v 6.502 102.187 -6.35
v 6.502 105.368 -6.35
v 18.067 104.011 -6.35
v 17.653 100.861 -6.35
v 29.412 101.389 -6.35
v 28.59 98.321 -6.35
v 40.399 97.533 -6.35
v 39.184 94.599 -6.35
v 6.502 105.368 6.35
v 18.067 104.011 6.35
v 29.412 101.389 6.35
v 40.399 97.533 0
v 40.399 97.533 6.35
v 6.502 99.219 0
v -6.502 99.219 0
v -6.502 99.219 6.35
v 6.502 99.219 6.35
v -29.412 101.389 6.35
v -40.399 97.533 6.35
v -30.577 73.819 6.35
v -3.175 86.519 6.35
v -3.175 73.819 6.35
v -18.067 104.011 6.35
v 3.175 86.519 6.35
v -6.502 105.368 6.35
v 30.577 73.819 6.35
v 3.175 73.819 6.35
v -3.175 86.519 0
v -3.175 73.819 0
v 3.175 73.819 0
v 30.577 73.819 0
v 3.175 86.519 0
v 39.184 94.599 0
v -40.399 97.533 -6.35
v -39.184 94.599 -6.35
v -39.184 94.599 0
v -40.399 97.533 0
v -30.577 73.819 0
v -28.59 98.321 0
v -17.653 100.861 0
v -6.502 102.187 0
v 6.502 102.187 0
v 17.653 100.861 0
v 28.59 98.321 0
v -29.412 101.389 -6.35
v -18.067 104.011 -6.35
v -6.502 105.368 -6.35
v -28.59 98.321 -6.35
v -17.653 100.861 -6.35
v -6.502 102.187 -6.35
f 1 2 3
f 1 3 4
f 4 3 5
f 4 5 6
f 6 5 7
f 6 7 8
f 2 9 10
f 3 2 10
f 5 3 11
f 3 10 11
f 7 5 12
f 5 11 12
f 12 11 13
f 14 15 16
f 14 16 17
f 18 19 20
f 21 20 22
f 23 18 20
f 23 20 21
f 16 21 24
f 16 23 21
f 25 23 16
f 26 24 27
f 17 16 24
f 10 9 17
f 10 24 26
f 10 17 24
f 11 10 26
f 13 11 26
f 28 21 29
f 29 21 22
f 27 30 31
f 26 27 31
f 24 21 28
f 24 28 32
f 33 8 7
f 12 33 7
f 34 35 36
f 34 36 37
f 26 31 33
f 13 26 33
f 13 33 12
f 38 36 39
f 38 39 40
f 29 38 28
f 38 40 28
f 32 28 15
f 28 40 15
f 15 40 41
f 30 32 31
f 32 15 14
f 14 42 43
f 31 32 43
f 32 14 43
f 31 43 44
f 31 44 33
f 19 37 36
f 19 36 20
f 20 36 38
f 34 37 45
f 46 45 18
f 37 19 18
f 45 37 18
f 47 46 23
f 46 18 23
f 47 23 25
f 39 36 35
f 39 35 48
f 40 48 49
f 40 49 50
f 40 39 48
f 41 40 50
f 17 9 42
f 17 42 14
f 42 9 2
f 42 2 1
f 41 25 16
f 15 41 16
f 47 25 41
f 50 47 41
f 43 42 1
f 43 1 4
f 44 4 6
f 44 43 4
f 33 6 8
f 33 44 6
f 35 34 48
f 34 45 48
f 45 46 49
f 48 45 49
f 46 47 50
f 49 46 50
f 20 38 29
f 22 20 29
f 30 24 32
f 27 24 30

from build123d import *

# Parameters (mm, degrees)
F1_DEPTH      = 6.35
F2_W          = 3.175
F2_H          = 6.35
F4_ANGLE_BACK = 22.5
F4_ANGLE      = 45
F5_W          = 6.35
F5_H          = 12.7
F5_W_2        = 13.0048
F6_DEPTH      = 12.7


with BuildPart() as f1:
    # F0 (on Top) → F1 (new body)
    with BuildSketch(Plane.XY):
        with BuildLine():
            Line((30.5767274074, 73.81875), (40.3994116005, 97.5328073978))
            ThreePointArc((40.3994116005, 97.5328073978), (0, 105.56875), (-40.3994116005, 97.5328073978))
            Line((-40.3994116005, 97.5328073978), (-30.5767274074, 73.81875))
            Line((-30.5767274074, 73.81875), (30.5767274074, 73.81875))
        make_face()
    extrude(amount=F1_DEPTH)

    # F2 (on Right) → F4 (revolve)
    with BuildSketch(Plane.YZ, mode=Mode.PRIVATE) as f4_sk:
        with Locations((103.98125, -3.175)):
            Rectangle(F2_W, F2_H)
    revolve(f4_sk.sketch.rotate(Axis((0, 0, 6.6674984992), (0, 0, -1)), -F4_ANGLE_BACK), axis=Axis((0, 0, 6.6674984992), (0, 0, -1)), revolution_arc=F4_ANGLE)

    # F5 (on face) → F6 (cut, symmetric)
    with BuildSketch(Plane(origin=(0, 0, 0), x_dir=(1, 0, 0), z_dir=(0, 0, -1))):
        with Locations((0, -80.16875)):
            Rectangle(F5_W, F5_H)
        with Locations((0, -105.56875)):
            Rectangle(F5_W_2, F5_H)
    extrude(amount=F6_DEPTH, both=True, mode=Mode.SUBTRACT)


solid = f1.part
